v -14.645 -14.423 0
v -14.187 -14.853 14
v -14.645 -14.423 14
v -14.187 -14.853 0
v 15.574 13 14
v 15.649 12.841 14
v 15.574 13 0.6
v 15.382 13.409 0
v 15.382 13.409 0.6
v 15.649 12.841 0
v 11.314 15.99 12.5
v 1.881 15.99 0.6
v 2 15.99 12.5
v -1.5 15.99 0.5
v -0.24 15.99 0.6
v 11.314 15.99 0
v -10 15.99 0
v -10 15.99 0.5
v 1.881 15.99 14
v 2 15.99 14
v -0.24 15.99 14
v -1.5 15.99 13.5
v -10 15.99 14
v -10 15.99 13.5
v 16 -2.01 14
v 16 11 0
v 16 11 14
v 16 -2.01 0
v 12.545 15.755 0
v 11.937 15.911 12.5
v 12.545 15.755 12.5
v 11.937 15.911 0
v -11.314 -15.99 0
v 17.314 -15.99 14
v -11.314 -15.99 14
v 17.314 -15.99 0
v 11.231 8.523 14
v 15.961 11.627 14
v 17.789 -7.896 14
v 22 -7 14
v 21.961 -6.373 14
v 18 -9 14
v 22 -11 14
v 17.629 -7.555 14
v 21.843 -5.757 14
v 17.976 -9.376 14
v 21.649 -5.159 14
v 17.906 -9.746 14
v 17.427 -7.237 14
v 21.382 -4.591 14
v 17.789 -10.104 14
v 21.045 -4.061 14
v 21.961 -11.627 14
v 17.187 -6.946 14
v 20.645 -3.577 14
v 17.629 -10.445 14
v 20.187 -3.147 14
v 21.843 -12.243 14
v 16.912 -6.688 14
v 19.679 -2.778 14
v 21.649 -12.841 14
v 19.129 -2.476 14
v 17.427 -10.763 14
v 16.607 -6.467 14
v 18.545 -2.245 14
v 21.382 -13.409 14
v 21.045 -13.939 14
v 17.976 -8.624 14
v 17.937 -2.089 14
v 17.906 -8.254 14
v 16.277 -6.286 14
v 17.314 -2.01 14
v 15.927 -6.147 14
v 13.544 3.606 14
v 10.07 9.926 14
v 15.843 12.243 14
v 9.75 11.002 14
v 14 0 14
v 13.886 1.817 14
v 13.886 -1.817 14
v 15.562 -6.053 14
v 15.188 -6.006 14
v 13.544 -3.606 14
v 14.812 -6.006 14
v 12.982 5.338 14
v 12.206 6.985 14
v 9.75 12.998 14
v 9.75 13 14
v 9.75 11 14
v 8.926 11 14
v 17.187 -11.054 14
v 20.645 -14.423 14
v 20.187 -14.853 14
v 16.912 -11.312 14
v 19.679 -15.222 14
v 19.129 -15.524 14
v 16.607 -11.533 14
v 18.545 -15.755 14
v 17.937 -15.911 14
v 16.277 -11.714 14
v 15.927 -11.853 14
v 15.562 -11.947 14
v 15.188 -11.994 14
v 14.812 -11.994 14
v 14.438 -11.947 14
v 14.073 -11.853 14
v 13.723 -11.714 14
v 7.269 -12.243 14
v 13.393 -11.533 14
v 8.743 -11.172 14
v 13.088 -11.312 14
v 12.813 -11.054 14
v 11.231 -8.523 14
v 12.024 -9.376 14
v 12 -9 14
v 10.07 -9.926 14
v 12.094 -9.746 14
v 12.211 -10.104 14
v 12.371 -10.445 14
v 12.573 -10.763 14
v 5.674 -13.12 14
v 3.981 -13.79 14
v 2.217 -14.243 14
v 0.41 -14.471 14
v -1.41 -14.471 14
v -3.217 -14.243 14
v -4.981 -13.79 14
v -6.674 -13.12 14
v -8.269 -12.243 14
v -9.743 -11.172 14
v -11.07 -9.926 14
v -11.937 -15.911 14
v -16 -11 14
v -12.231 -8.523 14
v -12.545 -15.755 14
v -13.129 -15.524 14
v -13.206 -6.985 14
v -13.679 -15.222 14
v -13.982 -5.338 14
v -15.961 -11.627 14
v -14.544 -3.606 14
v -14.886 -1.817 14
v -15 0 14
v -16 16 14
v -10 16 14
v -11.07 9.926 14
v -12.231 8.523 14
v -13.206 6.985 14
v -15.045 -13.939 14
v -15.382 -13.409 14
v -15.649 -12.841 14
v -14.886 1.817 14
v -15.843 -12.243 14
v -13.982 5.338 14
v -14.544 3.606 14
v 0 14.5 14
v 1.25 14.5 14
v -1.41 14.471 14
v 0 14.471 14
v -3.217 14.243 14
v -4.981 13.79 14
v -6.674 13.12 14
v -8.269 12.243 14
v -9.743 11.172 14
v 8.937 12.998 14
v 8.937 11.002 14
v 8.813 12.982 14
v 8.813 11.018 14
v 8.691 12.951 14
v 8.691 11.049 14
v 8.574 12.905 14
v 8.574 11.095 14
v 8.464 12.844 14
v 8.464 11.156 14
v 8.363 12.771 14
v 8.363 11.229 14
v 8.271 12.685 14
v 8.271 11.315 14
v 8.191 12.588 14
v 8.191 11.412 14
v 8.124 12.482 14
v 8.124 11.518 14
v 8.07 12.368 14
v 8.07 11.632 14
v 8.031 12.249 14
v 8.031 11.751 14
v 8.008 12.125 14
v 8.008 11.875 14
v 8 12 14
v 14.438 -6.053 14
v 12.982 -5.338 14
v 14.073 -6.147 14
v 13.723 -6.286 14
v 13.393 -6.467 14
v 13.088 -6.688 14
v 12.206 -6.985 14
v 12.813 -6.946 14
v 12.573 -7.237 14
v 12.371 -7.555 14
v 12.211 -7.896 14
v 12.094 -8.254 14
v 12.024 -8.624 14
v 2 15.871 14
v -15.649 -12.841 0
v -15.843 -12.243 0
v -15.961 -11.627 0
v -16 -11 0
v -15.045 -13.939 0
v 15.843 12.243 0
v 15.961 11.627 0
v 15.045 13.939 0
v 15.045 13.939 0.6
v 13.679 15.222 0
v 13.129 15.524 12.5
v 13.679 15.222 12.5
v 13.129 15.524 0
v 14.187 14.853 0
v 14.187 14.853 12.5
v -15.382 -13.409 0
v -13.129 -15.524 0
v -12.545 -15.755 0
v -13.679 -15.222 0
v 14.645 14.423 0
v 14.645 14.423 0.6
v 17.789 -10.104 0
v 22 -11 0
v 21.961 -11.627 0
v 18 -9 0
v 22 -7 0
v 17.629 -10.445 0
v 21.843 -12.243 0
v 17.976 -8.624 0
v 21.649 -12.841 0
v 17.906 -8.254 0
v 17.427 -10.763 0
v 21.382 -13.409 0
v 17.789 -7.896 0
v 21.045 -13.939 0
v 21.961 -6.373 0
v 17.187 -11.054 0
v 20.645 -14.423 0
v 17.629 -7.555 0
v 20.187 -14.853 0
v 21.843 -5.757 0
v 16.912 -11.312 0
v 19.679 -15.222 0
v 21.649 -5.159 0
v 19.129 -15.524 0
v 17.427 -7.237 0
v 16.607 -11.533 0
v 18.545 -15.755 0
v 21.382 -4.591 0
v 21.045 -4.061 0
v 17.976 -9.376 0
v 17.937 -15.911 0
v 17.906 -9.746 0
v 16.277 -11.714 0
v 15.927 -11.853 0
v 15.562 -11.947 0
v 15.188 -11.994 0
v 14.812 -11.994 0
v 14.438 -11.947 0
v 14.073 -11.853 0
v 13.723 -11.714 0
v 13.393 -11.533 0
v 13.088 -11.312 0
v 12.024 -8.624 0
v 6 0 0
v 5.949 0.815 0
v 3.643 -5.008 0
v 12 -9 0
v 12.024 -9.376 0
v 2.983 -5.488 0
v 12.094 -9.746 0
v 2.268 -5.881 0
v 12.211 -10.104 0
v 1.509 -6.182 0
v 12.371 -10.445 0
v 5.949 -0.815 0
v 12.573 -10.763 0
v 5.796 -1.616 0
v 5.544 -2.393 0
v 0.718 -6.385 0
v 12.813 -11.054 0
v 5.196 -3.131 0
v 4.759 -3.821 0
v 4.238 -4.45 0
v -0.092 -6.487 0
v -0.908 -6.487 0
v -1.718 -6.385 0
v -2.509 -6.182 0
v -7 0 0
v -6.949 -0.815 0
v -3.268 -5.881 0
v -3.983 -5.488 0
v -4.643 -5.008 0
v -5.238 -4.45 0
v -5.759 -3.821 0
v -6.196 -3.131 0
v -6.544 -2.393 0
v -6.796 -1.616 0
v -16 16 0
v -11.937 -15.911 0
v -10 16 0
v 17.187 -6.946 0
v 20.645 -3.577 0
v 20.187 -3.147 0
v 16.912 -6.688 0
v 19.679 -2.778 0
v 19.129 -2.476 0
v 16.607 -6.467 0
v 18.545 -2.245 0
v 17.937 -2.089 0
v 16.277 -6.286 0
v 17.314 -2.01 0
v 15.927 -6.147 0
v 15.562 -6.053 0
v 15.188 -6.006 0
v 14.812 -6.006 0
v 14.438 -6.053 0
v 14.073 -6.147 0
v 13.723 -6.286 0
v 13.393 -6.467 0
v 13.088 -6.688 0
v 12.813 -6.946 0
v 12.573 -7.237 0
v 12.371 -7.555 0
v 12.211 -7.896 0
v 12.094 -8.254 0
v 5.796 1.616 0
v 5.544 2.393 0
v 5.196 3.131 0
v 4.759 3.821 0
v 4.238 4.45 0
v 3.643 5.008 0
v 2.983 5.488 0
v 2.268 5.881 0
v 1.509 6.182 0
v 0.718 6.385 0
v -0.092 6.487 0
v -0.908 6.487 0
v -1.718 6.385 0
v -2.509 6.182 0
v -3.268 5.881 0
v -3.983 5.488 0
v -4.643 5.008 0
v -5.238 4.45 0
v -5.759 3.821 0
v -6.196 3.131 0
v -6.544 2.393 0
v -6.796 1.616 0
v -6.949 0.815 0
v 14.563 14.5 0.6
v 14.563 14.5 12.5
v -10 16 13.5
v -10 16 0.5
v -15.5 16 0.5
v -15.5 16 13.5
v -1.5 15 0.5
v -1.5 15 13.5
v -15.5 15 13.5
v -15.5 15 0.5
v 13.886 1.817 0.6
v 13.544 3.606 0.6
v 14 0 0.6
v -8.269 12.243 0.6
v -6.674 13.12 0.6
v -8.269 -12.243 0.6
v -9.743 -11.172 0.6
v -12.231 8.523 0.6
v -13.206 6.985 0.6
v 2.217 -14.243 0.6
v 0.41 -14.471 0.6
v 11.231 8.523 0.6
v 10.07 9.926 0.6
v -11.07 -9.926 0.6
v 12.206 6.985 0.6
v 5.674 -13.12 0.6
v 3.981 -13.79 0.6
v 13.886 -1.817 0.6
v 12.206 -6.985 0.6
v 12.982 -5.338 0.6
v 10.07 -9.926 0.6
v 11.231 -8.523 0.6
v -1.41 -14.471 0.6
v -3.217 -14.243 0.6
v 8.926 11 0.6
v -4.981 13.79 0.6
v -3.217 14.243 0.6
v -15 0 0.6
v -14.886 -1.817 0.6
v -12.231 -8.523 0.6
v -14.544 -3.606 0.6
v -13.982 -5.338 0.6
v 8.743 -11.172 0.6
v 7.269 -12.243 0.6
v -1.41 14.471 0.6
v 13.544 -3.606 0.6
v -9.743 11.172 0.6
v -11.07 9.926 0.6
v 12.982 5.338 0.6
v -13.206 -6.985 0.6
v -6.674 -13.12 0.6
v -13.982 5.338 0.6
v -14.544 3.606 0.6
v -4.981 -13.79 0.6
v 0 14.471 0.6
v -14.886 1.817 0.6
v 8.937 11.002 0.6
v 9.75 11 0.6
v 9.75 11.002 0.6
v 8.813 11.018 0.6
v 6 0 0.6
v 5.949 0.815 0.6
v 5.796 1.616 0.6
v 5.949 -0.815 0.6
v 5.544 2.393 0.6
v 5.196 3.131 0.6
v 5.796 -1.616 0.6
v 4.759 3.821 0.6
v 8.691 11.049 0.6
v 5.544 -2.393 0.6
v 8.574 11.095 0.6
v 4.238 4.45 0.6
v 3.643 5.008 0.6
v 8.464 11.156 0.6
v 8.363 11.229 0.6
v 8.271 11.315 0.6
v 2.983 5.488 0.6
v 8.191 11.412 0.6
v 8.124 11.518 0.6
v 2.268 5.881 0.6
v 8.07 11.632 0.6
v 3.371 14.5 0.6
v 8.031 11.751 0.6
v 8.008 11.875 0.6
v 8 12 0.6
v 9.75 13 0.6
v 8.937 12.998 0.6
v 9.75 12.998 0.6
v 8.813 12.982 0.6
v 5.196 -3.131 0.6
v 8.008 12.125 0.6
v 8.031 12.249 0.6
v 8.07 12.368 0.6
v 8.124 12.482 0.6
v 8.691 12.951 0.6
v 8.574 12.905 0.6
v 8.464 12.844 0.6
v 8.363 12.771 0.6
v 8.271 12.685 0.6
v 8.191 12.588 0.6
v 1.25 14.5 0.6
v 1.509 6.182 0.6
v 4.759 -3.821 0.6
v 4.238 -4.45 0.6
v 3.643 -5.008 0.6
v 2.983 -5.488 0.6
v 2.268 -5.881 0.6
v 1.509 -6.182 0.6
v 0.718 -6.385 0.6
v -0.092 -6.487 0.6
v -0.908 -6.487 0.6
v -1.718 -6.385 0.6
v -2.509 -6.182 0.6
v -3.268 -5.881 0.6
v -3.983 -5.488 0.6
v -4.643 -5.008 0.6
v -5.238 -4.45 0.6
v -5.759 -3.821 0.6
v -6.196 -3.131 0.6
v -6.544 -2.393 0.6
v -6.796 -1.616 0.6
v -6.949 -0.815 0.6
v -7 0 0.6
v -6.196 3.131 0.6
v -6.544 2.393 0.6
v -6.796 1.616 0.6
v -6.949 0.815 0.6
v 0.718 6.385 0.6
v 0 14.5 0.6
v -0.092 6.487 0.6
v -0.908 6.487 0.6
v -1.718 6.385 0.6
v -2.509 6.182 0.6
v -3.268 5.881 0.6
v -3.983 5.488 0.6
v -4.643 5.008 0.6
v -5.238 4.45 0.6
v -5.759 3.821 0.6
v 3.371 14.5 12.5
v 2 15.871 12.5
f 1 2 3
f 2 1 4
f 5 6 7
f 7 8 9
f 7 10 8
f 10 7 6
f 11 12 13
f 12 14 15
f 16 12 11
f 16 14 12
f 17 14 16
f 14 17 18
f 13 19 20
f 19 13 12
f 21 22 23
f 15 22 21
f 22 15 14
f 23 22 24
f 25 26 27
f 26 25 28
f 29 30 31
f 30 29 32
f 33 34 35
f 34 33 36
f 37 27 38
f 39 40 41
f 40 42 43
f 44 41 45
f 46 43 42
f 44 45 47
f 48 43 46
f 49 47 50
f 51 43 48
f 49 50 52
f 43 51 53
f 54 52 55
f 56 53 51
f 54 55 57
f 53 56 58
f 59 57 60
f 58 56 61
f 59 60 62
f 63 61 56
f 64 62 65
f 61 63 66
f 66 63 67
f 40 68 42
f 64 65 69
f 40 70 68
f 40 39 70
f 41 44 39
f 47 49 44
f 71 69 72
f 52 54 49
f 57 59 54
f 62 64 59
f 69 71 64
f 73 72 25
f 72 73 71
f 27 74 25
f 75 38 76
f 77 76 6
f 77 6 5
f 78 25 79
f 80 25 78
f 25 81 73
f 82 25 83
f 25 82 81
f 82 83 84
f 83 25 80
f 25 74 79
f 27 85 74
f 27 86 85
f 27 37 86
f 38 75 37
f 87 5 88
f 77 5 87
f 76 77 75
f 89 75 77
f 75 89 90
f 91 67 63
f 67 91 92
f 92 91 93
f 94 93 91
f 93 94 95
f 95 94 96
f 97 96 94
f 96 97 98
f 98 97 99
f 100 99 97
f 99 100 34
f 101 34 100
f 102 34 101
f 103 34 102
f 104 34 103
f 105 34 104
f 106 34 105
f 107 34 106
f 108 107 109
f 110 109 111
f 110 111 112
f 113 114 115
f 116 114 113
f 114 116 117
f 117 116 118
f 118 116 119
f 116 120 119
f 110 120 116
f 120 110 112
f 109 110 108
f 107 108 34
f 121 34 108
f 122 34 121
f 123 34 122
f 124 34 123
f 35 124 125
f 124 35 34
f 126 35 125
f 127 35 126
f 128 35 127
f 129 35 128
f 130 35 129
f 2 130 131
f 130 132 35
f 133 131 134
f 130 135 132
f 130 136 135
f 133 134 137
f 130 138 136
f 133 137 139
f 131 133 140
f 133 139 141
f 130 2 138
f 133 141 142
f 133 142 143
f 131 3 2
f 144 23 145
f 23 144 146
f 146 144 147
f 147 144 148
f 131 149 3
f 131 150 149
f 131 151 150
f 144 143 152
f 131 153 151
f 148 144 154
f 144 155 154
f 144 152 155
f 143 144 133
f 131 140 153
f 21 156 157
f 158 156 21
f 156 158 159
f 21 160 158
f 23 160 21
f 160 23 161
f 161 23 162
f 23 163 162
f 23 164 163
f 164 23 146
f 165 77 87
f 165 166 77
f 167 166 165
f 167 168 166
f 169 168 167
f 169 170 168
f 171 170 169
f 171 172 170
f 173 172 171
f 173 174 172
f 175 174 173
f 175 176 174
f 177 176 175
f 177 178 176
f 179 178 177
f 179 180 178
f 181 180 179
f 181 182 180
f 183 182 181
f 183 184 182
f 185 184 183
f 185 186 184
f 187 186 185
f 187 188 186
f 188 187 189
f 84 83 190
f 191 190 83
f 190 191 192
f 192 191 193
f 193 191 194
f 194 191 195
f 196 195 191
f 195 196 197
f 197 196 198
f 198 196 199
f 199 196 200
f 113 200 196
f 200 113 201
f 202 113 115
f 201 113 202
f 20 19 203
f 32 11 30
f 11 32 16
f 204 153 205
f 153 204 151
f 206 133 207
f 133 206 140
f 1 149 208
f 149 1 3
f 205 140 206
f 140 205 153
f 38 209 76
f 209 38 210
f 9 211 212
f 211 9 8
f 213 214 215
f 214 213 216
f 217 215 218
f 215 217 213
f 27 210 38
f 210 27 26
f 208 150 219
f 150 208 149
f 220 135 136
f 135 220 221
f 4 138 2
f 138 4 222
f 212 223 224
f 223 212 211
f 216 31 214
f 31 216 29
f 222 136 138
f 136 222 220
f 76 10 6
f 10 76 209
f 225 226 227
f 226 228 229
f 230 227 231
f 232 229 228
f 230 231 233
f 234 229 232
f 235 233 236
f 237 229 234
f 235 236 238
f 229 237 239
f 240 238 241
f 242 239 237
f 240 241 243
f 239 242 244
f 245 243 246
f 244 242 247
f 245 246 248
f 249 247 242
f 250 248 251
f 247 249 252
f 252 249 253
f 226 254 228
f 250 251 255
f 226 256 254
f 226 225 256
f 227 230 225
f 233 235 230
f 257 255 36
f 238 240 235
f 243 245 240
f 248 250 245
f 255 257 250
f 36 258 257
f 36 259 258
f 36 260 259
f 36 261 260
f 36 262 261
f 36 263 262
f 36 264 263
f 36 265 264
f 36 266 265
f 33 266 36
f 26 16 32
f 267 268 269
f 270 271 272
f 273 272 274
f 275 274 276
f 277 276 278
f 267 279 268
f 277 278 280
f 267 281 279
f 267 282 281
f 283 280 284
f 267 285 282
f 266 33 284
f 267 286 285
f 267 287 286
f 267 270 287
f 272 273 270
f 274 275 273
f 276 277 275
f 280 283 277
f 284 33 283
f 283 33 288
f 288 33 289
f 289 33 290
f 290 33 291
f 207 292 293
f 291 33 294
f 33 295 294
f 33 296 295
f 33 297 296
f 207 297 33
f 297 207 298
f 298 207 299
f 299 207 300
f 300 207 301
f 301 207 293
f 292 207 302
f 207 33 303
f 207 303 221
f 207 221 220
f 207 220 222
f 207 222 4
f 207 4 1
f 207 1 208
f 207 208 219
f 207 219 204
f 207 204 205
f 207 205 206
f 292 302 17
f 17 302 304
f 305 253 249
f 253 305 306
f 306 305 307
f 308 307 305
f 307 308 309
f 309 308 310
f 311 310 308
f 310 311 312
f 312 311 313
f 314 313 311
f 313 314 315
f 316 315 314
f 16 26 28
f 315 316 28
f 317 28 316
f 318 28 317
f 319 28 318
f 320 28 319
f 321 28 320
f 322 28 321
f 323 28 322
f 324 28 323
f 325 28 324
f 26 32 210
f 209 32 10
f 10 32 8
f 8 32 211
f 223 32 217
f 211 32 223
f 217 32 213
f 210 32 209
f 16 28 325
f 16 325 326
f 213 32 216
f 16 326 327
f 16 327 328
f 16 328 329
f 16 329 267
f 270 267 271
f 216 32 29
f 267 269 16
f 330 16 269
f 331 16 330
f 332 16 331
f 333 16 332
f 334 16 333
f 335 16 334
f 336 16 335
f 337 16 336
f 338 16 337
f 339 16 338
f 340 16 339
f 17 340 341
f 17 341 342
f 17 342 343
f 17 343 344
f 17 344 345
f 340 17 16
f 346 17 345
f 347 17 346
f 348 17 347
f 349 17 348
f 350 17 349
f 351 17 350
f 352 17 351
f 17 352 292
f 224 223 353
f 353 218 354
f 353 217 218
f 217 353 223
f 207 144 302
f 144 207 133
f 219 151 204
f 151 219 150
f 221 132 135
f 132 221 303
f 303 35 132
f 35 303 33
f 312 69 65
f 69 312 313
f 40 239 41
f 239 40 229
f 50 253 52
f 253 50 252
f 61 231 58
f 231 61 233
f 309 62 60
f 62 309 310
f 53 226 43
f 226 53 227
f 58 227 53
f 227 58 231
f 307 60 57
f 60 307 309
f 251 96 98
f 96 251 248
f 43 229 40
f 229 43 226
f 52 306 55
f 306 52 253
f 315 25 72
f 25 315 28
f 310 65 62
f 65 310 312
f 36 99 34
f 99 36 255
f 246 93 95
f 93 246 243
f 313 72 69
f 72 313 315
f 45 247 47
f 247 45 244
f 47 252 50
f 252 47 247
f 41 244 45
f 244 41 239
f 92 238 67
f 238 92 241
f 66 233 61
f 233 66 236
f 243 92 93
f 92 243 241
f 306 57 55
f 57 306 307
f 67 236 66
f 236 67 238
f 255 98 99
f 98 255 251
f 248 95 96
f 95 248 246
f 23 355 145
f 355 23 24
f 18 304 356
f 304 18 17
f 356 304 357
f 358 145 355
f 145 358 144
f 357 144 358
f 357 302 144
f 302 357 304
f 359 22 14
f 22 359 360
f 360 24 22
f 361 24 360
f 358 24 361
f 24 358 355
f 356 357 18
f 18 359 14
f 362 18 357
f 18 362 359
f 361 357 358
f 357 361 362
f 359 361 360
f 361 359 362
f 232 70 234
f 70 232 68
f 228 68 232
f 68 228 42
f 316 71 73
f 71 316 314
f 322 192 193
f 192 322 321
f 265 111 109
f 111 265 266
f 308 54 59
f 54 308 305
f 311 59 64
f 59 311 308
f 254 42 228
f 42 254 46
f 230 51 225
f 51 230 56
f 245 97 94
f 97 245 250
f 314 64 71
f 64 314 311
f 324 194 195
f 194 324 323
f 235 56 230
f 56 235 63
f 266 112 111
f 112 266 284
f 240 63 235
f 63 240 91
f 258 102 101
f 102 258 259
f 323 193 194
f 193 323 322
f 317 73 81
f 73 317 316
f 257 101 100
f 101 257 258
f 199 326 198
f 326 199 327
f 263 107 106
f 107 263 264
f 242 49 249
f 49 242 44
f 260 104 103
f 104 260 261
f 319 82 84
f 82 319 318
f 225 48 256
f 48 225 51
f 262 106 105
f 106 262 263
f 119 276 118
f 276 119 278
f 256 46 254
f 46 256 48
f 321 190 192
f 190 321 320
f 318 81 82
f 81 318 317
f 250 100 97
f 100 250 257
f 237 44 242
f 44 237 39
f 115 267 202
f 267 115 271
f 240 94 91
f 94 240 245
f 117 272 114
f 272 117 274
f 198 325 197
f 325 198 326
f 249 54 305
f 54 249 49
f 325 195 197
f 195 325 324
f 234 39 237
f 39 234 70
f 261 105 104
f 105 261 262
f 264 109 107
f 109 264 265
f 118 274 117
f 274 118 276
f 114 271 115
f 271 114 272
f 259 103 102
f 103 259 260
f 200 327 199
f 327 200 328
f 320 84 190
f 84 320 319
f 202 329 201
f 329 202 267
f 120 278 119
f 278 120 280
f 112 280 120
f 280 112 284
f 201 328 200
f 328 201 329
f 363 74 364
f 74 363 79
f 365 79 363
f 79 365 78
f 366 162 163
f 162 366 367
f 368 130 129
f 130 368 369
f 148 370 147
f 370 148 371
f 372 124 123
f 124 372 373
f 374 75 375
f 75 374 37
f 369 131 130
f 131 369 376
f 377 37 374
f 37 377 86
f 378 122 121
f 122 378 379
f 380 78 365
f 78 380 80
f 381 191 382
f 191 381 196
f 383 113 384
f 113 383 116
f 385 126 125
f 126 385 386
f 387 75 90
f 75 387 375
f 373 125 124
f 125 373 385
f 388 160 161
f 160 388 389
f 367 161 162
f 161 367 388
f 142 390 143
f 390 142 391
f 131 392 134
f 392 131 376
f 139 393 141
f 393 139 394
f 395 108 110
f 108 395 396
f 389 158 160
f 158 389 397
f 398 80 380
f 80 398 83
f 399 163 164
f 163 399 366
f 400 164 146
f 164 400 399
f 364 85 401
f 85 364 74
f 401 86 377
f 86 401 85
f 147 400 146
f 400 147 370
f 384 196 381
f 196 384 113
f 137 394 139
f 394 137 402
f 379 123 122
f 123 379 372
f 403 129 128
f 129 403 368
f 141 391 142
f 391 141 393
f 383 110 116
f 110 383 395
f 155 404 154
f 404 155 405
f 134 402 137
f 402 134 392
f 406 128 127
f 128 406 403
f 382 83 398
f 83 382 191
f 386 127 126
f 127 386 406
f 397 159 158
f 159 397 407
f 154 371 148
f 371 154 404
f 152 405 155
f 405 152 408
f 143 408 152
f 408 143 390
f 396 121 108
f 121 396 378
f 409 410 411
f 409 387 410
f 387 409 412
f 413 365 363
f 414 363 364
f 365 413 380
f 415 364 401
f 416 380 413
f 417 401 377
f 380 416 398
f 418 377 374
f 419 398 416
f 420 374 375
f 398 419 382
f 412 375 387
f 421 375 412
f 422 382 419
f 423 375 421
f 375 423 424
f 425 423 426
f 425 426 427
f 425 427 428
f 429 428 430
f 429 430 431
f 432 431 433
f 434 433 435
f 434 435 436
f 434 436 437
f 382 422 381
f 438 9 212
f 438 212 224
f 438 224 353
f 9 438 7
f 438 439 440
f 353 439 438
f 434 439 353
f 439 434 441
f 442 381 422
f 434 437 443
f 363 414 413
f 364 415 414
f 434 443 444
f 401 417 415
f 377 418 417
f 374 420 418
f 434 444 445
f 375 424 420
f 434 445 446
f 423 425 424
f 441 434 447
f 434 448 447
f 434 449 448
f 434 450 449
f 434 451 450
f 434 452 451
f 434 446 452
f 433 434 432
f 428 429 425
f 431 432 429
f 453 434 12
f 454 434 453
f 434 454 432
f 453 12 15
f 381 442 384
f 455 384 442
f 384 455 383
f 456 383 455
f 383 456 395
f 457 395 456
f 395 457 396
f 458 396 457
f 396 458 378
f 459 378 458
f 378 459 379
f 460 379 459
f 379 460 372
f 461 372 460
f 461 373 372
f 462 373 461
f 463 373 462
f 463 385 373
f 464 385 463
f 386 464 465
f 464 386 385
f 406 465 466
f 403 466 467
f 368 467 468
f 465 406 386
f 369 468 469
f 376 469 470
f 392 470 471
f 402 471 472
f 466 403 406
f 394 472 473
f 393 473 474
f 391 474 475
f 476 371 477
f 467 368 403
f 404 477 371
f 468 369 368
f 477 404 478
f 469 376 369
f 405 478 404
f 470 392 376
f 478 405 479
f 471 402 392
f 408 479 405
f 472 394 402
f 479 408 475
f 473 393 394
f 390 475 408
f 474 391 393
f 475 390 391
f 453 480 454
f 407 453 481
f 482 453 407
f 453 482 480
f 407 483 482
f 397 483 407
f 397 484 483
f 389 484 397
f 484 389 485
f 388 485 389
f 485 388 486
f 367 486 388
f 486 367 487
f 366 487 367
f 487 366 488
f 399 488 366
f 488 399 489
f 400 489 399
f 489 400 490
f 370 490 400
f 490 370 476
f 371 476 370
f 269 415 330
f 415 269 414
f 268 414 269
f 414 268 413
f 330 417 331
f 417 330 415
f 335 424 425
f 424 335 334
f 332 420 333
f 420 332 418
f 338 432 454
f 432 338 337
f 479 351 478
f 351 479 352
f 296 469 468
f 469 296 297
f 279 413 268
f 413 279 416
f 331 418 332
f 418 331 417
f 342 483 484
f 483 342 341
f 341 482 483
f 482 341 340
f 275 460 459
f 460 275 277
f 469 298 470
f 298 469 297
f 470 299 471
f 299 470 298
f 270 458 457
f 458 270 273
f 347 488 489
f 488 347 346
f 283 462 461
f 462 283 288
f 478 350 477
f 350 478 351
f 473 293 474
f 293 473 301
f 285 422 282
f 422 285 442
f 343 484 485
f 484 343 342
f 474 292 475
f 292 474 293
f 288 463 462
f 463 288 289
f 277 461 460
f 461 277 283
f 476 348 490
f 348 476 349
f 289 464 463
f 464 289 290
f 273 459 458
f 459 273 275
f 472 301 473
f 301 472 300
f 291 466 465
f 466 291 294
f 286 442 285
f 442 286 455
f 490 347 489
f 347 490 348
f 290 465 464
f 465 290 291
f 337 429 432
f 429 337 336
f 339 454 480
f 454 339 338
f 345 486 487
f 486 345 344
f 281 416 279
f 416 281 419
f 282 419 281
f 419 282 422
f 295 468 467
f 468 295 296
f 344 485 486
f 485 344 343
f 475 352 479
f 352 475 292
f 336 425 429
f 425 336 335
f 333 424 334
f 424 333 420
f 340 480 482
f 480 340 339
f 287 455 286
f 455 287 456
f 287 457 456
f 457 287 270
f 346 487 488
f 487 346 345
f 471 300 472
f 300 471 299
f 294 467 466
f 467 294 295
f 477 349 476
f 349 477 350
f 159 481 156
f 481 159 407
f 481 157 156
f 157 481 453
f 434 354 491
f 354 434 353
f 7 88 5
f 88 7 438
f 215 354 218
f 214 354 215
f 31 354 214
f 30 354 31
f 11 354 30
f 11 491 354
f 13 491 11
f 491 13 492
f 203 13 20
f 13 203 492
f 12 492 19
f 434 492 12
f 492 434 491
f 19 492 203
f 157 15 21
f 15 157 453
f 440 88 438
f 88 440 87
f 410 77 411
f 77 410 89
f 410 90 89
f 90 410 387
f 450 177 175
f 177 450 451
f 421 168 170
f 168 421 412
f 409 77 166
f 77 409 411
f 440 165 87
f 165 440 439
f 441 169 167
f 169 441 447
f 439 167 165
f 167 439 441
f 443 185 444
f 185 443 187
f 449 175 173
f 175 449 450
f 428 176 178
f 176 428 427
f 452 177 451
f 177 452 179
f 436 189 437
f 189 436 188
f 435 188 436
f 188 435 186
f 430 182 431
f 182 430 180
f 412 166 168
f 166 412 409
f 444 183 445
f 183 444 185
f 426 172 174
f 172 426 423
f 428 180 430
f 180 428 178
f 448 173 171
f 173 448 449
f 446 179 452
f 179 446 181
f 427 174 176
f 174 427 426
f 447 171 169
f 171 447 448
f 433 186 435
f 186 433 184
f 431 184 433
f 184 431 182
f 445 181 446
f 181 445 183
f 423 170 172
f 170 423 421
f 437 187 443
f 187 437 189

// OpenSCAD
$fn = 50;


union() {
	difference() {
		union() {
			translate(v = [0, 0, 0]) {
				rotate(a = [0, 0, 0]) {
					hull() {
						translate(v = [-11.0000000000, 11.0000000000, 0]) {
							rotate(a = [0, 0, 0]) {
								translate(v = [0, 0, 0]) {
									rotate(a = [0, 0, 0]) {
										cylinder(h = 14, r = 5);
									}
								}
							}
						}
						translate(v = [11.0000000000, 11.0000000000, 0]) {
							rotate(a = [0, 0, 0]) {
								translate(v = [0, 0, 0]) {
									rotate(a = [0, 0, 0]) {
										cylinder(h = 14, r = 5);
									}
								}
							}
						}
						translate(v = [-11.0000000000, -11.0000000000, 0]) {
							rotate(a = [0, 0, 0]) {
								translate(v = [0, 0, 0]) {
									rotate(a = [0, 0, 0]) {
										cylinder(h = 14, r = 5);
									}
								}
							}
						}
						translate(v = [11.0000000000, -11.0000000000, 0]) {
							rotate(a = [0, 0, 0]) {
								translate(v = [0, 0, 0]) {
									rotate(a = [0, 0, 0]) {
										cylinder(h = 14, r = 5);
									}
								}
							}
						}
					}
				}
			}
			translate(v = [7.5000000000, -9.0000000000, 0]) {
				rotate(a = [0, 0, 0]) {
					hull() {
						translate(v = [-9.5000000000, 2.0000000000, 0]) {
							rotate(a = [0, 0, 0]) {
								translate(v = [0, 0, 0]) {
									rotate(a = [0, 0, 0]) {
										cylinder(h = 14, r = 5);
									}
								}
							}
						}
						translate(v = [9.5000000000, 2.0000000000, 0]) {
							rotate(a = [0, 0, 0]) {
								translate(v = [0, 0, 0]) {
									rotate(a = [0, 0, 0]) {
										cylinder(h = 14, r = 5);
									}
								}
							}
						}
						translate(v = [-9.5000000000, -2.0000000000, 0]) {
							rotate(a = [0, 0, 0]) {
								translate(v = [0, 0, 0]) {
									rotate(a = [0, 0, 0]) {
										cylinder(h = 14, r = 5);
									}
								}
							}
						}
						translate(v = [9.5000000000, -2.0000000000, 0]) {
							rotate(a = [0, 0, 0]) {
								translate(v = [0, 0, 0]) {
									rotate(a = [0, 0, 0]) {
										cylinder(h = 14, r = 5);
									}
								}
							}
						}
					}
				}
			}
			translate(v = [-16.0000000000, 10.0000000000, 0]) {
				rotate(a = [0, 0, 0]) {
					cube(size = [6, 6, 14]);
				}
			}
		}
		union() {
			translate(v = [-15.5000000000, 15.0000000000, 0.5000000000]) {
				rotate(a = [0, 0, 0]) {
					cube(size = [14, 1, 13.0000000000]);
				}
			}
			translate(v = [15.0000000000, -9.0000000000, -125.0000000000]) {
				rotate(a = [0, 0, 0]) {
					cylinder(h = 250, r = 3.0000000000);
				}
			}
			translate(v = [-0.5000000000, 0.0000000000, 0.6000000000]) {
				rotate(a = [0, 0, 0]) {
					cylinder(h = 16.4000000000, r = 14.5000000000);
				}
			}
			translate(v = [-0.5000000000, 0.0000000000, -7.0000000000]) {
				rotate(a = [0, 0, 0]) {
					cylinder(h = 14, r = 6.5000000000);
				}
			}
			translate(v = [0.0000000000, 13.0000000000, 0.6000000000]) {
				rotate(a = [0, 0, 0]) {
					cube(size = [16.0000000000, 1.5000000000, 16.4000000000]);
				}
			}
			translate(v = [2.0000000000, 13.0000000000, 12.5000000000]) {
				rotate(a = [0, 0, 0]) {
					cube(size = [14.0000000000, 4.5000000000, 1.5000000000]);
				}
			}
			translate(v = [-3.0000000000, 18.7500000000, 0.6000000000]) {
				rotate(a = [0, 0, -45]) {
					cube(size = [10, 1.5000000000, 16.4000000000]);
				}
			}
			translate(v = [2.2500000000, 11.0000000000, 0.6000000000]) {
				rotate(a = [0, 0, 0]) {
					cube(size = [7.5000000000, 2, 13.4000000000]);
				}
			}
		}
	}
	union() {
		translate(v = [11.5000000000, 12, 0]) {
			rotate(a = [0, 0, 0]) {
				hull() {
					translate(v = [2.5000000000, 0, 0]) {
						rotate(a = [0, 0, 0]) {
							translate(v = [0, 0, 0]) {
								rotate(a = [0, 0, 0]) {
									cylinder(h = 14, r = 1.0000000000);
								}
							}
						}
					}
					translate(v = [-2.5000000000, 0, 0]) {
						rotate(a = [0, 0, 0]) {
							translate(v = [0, 0, 0]) {
								rotate(a = [0, 0, 0]) {
									cylinder(h = 14, r = 1.0000000000);
								}
							}
						}
					}
				}
			}
		}
	}
}
